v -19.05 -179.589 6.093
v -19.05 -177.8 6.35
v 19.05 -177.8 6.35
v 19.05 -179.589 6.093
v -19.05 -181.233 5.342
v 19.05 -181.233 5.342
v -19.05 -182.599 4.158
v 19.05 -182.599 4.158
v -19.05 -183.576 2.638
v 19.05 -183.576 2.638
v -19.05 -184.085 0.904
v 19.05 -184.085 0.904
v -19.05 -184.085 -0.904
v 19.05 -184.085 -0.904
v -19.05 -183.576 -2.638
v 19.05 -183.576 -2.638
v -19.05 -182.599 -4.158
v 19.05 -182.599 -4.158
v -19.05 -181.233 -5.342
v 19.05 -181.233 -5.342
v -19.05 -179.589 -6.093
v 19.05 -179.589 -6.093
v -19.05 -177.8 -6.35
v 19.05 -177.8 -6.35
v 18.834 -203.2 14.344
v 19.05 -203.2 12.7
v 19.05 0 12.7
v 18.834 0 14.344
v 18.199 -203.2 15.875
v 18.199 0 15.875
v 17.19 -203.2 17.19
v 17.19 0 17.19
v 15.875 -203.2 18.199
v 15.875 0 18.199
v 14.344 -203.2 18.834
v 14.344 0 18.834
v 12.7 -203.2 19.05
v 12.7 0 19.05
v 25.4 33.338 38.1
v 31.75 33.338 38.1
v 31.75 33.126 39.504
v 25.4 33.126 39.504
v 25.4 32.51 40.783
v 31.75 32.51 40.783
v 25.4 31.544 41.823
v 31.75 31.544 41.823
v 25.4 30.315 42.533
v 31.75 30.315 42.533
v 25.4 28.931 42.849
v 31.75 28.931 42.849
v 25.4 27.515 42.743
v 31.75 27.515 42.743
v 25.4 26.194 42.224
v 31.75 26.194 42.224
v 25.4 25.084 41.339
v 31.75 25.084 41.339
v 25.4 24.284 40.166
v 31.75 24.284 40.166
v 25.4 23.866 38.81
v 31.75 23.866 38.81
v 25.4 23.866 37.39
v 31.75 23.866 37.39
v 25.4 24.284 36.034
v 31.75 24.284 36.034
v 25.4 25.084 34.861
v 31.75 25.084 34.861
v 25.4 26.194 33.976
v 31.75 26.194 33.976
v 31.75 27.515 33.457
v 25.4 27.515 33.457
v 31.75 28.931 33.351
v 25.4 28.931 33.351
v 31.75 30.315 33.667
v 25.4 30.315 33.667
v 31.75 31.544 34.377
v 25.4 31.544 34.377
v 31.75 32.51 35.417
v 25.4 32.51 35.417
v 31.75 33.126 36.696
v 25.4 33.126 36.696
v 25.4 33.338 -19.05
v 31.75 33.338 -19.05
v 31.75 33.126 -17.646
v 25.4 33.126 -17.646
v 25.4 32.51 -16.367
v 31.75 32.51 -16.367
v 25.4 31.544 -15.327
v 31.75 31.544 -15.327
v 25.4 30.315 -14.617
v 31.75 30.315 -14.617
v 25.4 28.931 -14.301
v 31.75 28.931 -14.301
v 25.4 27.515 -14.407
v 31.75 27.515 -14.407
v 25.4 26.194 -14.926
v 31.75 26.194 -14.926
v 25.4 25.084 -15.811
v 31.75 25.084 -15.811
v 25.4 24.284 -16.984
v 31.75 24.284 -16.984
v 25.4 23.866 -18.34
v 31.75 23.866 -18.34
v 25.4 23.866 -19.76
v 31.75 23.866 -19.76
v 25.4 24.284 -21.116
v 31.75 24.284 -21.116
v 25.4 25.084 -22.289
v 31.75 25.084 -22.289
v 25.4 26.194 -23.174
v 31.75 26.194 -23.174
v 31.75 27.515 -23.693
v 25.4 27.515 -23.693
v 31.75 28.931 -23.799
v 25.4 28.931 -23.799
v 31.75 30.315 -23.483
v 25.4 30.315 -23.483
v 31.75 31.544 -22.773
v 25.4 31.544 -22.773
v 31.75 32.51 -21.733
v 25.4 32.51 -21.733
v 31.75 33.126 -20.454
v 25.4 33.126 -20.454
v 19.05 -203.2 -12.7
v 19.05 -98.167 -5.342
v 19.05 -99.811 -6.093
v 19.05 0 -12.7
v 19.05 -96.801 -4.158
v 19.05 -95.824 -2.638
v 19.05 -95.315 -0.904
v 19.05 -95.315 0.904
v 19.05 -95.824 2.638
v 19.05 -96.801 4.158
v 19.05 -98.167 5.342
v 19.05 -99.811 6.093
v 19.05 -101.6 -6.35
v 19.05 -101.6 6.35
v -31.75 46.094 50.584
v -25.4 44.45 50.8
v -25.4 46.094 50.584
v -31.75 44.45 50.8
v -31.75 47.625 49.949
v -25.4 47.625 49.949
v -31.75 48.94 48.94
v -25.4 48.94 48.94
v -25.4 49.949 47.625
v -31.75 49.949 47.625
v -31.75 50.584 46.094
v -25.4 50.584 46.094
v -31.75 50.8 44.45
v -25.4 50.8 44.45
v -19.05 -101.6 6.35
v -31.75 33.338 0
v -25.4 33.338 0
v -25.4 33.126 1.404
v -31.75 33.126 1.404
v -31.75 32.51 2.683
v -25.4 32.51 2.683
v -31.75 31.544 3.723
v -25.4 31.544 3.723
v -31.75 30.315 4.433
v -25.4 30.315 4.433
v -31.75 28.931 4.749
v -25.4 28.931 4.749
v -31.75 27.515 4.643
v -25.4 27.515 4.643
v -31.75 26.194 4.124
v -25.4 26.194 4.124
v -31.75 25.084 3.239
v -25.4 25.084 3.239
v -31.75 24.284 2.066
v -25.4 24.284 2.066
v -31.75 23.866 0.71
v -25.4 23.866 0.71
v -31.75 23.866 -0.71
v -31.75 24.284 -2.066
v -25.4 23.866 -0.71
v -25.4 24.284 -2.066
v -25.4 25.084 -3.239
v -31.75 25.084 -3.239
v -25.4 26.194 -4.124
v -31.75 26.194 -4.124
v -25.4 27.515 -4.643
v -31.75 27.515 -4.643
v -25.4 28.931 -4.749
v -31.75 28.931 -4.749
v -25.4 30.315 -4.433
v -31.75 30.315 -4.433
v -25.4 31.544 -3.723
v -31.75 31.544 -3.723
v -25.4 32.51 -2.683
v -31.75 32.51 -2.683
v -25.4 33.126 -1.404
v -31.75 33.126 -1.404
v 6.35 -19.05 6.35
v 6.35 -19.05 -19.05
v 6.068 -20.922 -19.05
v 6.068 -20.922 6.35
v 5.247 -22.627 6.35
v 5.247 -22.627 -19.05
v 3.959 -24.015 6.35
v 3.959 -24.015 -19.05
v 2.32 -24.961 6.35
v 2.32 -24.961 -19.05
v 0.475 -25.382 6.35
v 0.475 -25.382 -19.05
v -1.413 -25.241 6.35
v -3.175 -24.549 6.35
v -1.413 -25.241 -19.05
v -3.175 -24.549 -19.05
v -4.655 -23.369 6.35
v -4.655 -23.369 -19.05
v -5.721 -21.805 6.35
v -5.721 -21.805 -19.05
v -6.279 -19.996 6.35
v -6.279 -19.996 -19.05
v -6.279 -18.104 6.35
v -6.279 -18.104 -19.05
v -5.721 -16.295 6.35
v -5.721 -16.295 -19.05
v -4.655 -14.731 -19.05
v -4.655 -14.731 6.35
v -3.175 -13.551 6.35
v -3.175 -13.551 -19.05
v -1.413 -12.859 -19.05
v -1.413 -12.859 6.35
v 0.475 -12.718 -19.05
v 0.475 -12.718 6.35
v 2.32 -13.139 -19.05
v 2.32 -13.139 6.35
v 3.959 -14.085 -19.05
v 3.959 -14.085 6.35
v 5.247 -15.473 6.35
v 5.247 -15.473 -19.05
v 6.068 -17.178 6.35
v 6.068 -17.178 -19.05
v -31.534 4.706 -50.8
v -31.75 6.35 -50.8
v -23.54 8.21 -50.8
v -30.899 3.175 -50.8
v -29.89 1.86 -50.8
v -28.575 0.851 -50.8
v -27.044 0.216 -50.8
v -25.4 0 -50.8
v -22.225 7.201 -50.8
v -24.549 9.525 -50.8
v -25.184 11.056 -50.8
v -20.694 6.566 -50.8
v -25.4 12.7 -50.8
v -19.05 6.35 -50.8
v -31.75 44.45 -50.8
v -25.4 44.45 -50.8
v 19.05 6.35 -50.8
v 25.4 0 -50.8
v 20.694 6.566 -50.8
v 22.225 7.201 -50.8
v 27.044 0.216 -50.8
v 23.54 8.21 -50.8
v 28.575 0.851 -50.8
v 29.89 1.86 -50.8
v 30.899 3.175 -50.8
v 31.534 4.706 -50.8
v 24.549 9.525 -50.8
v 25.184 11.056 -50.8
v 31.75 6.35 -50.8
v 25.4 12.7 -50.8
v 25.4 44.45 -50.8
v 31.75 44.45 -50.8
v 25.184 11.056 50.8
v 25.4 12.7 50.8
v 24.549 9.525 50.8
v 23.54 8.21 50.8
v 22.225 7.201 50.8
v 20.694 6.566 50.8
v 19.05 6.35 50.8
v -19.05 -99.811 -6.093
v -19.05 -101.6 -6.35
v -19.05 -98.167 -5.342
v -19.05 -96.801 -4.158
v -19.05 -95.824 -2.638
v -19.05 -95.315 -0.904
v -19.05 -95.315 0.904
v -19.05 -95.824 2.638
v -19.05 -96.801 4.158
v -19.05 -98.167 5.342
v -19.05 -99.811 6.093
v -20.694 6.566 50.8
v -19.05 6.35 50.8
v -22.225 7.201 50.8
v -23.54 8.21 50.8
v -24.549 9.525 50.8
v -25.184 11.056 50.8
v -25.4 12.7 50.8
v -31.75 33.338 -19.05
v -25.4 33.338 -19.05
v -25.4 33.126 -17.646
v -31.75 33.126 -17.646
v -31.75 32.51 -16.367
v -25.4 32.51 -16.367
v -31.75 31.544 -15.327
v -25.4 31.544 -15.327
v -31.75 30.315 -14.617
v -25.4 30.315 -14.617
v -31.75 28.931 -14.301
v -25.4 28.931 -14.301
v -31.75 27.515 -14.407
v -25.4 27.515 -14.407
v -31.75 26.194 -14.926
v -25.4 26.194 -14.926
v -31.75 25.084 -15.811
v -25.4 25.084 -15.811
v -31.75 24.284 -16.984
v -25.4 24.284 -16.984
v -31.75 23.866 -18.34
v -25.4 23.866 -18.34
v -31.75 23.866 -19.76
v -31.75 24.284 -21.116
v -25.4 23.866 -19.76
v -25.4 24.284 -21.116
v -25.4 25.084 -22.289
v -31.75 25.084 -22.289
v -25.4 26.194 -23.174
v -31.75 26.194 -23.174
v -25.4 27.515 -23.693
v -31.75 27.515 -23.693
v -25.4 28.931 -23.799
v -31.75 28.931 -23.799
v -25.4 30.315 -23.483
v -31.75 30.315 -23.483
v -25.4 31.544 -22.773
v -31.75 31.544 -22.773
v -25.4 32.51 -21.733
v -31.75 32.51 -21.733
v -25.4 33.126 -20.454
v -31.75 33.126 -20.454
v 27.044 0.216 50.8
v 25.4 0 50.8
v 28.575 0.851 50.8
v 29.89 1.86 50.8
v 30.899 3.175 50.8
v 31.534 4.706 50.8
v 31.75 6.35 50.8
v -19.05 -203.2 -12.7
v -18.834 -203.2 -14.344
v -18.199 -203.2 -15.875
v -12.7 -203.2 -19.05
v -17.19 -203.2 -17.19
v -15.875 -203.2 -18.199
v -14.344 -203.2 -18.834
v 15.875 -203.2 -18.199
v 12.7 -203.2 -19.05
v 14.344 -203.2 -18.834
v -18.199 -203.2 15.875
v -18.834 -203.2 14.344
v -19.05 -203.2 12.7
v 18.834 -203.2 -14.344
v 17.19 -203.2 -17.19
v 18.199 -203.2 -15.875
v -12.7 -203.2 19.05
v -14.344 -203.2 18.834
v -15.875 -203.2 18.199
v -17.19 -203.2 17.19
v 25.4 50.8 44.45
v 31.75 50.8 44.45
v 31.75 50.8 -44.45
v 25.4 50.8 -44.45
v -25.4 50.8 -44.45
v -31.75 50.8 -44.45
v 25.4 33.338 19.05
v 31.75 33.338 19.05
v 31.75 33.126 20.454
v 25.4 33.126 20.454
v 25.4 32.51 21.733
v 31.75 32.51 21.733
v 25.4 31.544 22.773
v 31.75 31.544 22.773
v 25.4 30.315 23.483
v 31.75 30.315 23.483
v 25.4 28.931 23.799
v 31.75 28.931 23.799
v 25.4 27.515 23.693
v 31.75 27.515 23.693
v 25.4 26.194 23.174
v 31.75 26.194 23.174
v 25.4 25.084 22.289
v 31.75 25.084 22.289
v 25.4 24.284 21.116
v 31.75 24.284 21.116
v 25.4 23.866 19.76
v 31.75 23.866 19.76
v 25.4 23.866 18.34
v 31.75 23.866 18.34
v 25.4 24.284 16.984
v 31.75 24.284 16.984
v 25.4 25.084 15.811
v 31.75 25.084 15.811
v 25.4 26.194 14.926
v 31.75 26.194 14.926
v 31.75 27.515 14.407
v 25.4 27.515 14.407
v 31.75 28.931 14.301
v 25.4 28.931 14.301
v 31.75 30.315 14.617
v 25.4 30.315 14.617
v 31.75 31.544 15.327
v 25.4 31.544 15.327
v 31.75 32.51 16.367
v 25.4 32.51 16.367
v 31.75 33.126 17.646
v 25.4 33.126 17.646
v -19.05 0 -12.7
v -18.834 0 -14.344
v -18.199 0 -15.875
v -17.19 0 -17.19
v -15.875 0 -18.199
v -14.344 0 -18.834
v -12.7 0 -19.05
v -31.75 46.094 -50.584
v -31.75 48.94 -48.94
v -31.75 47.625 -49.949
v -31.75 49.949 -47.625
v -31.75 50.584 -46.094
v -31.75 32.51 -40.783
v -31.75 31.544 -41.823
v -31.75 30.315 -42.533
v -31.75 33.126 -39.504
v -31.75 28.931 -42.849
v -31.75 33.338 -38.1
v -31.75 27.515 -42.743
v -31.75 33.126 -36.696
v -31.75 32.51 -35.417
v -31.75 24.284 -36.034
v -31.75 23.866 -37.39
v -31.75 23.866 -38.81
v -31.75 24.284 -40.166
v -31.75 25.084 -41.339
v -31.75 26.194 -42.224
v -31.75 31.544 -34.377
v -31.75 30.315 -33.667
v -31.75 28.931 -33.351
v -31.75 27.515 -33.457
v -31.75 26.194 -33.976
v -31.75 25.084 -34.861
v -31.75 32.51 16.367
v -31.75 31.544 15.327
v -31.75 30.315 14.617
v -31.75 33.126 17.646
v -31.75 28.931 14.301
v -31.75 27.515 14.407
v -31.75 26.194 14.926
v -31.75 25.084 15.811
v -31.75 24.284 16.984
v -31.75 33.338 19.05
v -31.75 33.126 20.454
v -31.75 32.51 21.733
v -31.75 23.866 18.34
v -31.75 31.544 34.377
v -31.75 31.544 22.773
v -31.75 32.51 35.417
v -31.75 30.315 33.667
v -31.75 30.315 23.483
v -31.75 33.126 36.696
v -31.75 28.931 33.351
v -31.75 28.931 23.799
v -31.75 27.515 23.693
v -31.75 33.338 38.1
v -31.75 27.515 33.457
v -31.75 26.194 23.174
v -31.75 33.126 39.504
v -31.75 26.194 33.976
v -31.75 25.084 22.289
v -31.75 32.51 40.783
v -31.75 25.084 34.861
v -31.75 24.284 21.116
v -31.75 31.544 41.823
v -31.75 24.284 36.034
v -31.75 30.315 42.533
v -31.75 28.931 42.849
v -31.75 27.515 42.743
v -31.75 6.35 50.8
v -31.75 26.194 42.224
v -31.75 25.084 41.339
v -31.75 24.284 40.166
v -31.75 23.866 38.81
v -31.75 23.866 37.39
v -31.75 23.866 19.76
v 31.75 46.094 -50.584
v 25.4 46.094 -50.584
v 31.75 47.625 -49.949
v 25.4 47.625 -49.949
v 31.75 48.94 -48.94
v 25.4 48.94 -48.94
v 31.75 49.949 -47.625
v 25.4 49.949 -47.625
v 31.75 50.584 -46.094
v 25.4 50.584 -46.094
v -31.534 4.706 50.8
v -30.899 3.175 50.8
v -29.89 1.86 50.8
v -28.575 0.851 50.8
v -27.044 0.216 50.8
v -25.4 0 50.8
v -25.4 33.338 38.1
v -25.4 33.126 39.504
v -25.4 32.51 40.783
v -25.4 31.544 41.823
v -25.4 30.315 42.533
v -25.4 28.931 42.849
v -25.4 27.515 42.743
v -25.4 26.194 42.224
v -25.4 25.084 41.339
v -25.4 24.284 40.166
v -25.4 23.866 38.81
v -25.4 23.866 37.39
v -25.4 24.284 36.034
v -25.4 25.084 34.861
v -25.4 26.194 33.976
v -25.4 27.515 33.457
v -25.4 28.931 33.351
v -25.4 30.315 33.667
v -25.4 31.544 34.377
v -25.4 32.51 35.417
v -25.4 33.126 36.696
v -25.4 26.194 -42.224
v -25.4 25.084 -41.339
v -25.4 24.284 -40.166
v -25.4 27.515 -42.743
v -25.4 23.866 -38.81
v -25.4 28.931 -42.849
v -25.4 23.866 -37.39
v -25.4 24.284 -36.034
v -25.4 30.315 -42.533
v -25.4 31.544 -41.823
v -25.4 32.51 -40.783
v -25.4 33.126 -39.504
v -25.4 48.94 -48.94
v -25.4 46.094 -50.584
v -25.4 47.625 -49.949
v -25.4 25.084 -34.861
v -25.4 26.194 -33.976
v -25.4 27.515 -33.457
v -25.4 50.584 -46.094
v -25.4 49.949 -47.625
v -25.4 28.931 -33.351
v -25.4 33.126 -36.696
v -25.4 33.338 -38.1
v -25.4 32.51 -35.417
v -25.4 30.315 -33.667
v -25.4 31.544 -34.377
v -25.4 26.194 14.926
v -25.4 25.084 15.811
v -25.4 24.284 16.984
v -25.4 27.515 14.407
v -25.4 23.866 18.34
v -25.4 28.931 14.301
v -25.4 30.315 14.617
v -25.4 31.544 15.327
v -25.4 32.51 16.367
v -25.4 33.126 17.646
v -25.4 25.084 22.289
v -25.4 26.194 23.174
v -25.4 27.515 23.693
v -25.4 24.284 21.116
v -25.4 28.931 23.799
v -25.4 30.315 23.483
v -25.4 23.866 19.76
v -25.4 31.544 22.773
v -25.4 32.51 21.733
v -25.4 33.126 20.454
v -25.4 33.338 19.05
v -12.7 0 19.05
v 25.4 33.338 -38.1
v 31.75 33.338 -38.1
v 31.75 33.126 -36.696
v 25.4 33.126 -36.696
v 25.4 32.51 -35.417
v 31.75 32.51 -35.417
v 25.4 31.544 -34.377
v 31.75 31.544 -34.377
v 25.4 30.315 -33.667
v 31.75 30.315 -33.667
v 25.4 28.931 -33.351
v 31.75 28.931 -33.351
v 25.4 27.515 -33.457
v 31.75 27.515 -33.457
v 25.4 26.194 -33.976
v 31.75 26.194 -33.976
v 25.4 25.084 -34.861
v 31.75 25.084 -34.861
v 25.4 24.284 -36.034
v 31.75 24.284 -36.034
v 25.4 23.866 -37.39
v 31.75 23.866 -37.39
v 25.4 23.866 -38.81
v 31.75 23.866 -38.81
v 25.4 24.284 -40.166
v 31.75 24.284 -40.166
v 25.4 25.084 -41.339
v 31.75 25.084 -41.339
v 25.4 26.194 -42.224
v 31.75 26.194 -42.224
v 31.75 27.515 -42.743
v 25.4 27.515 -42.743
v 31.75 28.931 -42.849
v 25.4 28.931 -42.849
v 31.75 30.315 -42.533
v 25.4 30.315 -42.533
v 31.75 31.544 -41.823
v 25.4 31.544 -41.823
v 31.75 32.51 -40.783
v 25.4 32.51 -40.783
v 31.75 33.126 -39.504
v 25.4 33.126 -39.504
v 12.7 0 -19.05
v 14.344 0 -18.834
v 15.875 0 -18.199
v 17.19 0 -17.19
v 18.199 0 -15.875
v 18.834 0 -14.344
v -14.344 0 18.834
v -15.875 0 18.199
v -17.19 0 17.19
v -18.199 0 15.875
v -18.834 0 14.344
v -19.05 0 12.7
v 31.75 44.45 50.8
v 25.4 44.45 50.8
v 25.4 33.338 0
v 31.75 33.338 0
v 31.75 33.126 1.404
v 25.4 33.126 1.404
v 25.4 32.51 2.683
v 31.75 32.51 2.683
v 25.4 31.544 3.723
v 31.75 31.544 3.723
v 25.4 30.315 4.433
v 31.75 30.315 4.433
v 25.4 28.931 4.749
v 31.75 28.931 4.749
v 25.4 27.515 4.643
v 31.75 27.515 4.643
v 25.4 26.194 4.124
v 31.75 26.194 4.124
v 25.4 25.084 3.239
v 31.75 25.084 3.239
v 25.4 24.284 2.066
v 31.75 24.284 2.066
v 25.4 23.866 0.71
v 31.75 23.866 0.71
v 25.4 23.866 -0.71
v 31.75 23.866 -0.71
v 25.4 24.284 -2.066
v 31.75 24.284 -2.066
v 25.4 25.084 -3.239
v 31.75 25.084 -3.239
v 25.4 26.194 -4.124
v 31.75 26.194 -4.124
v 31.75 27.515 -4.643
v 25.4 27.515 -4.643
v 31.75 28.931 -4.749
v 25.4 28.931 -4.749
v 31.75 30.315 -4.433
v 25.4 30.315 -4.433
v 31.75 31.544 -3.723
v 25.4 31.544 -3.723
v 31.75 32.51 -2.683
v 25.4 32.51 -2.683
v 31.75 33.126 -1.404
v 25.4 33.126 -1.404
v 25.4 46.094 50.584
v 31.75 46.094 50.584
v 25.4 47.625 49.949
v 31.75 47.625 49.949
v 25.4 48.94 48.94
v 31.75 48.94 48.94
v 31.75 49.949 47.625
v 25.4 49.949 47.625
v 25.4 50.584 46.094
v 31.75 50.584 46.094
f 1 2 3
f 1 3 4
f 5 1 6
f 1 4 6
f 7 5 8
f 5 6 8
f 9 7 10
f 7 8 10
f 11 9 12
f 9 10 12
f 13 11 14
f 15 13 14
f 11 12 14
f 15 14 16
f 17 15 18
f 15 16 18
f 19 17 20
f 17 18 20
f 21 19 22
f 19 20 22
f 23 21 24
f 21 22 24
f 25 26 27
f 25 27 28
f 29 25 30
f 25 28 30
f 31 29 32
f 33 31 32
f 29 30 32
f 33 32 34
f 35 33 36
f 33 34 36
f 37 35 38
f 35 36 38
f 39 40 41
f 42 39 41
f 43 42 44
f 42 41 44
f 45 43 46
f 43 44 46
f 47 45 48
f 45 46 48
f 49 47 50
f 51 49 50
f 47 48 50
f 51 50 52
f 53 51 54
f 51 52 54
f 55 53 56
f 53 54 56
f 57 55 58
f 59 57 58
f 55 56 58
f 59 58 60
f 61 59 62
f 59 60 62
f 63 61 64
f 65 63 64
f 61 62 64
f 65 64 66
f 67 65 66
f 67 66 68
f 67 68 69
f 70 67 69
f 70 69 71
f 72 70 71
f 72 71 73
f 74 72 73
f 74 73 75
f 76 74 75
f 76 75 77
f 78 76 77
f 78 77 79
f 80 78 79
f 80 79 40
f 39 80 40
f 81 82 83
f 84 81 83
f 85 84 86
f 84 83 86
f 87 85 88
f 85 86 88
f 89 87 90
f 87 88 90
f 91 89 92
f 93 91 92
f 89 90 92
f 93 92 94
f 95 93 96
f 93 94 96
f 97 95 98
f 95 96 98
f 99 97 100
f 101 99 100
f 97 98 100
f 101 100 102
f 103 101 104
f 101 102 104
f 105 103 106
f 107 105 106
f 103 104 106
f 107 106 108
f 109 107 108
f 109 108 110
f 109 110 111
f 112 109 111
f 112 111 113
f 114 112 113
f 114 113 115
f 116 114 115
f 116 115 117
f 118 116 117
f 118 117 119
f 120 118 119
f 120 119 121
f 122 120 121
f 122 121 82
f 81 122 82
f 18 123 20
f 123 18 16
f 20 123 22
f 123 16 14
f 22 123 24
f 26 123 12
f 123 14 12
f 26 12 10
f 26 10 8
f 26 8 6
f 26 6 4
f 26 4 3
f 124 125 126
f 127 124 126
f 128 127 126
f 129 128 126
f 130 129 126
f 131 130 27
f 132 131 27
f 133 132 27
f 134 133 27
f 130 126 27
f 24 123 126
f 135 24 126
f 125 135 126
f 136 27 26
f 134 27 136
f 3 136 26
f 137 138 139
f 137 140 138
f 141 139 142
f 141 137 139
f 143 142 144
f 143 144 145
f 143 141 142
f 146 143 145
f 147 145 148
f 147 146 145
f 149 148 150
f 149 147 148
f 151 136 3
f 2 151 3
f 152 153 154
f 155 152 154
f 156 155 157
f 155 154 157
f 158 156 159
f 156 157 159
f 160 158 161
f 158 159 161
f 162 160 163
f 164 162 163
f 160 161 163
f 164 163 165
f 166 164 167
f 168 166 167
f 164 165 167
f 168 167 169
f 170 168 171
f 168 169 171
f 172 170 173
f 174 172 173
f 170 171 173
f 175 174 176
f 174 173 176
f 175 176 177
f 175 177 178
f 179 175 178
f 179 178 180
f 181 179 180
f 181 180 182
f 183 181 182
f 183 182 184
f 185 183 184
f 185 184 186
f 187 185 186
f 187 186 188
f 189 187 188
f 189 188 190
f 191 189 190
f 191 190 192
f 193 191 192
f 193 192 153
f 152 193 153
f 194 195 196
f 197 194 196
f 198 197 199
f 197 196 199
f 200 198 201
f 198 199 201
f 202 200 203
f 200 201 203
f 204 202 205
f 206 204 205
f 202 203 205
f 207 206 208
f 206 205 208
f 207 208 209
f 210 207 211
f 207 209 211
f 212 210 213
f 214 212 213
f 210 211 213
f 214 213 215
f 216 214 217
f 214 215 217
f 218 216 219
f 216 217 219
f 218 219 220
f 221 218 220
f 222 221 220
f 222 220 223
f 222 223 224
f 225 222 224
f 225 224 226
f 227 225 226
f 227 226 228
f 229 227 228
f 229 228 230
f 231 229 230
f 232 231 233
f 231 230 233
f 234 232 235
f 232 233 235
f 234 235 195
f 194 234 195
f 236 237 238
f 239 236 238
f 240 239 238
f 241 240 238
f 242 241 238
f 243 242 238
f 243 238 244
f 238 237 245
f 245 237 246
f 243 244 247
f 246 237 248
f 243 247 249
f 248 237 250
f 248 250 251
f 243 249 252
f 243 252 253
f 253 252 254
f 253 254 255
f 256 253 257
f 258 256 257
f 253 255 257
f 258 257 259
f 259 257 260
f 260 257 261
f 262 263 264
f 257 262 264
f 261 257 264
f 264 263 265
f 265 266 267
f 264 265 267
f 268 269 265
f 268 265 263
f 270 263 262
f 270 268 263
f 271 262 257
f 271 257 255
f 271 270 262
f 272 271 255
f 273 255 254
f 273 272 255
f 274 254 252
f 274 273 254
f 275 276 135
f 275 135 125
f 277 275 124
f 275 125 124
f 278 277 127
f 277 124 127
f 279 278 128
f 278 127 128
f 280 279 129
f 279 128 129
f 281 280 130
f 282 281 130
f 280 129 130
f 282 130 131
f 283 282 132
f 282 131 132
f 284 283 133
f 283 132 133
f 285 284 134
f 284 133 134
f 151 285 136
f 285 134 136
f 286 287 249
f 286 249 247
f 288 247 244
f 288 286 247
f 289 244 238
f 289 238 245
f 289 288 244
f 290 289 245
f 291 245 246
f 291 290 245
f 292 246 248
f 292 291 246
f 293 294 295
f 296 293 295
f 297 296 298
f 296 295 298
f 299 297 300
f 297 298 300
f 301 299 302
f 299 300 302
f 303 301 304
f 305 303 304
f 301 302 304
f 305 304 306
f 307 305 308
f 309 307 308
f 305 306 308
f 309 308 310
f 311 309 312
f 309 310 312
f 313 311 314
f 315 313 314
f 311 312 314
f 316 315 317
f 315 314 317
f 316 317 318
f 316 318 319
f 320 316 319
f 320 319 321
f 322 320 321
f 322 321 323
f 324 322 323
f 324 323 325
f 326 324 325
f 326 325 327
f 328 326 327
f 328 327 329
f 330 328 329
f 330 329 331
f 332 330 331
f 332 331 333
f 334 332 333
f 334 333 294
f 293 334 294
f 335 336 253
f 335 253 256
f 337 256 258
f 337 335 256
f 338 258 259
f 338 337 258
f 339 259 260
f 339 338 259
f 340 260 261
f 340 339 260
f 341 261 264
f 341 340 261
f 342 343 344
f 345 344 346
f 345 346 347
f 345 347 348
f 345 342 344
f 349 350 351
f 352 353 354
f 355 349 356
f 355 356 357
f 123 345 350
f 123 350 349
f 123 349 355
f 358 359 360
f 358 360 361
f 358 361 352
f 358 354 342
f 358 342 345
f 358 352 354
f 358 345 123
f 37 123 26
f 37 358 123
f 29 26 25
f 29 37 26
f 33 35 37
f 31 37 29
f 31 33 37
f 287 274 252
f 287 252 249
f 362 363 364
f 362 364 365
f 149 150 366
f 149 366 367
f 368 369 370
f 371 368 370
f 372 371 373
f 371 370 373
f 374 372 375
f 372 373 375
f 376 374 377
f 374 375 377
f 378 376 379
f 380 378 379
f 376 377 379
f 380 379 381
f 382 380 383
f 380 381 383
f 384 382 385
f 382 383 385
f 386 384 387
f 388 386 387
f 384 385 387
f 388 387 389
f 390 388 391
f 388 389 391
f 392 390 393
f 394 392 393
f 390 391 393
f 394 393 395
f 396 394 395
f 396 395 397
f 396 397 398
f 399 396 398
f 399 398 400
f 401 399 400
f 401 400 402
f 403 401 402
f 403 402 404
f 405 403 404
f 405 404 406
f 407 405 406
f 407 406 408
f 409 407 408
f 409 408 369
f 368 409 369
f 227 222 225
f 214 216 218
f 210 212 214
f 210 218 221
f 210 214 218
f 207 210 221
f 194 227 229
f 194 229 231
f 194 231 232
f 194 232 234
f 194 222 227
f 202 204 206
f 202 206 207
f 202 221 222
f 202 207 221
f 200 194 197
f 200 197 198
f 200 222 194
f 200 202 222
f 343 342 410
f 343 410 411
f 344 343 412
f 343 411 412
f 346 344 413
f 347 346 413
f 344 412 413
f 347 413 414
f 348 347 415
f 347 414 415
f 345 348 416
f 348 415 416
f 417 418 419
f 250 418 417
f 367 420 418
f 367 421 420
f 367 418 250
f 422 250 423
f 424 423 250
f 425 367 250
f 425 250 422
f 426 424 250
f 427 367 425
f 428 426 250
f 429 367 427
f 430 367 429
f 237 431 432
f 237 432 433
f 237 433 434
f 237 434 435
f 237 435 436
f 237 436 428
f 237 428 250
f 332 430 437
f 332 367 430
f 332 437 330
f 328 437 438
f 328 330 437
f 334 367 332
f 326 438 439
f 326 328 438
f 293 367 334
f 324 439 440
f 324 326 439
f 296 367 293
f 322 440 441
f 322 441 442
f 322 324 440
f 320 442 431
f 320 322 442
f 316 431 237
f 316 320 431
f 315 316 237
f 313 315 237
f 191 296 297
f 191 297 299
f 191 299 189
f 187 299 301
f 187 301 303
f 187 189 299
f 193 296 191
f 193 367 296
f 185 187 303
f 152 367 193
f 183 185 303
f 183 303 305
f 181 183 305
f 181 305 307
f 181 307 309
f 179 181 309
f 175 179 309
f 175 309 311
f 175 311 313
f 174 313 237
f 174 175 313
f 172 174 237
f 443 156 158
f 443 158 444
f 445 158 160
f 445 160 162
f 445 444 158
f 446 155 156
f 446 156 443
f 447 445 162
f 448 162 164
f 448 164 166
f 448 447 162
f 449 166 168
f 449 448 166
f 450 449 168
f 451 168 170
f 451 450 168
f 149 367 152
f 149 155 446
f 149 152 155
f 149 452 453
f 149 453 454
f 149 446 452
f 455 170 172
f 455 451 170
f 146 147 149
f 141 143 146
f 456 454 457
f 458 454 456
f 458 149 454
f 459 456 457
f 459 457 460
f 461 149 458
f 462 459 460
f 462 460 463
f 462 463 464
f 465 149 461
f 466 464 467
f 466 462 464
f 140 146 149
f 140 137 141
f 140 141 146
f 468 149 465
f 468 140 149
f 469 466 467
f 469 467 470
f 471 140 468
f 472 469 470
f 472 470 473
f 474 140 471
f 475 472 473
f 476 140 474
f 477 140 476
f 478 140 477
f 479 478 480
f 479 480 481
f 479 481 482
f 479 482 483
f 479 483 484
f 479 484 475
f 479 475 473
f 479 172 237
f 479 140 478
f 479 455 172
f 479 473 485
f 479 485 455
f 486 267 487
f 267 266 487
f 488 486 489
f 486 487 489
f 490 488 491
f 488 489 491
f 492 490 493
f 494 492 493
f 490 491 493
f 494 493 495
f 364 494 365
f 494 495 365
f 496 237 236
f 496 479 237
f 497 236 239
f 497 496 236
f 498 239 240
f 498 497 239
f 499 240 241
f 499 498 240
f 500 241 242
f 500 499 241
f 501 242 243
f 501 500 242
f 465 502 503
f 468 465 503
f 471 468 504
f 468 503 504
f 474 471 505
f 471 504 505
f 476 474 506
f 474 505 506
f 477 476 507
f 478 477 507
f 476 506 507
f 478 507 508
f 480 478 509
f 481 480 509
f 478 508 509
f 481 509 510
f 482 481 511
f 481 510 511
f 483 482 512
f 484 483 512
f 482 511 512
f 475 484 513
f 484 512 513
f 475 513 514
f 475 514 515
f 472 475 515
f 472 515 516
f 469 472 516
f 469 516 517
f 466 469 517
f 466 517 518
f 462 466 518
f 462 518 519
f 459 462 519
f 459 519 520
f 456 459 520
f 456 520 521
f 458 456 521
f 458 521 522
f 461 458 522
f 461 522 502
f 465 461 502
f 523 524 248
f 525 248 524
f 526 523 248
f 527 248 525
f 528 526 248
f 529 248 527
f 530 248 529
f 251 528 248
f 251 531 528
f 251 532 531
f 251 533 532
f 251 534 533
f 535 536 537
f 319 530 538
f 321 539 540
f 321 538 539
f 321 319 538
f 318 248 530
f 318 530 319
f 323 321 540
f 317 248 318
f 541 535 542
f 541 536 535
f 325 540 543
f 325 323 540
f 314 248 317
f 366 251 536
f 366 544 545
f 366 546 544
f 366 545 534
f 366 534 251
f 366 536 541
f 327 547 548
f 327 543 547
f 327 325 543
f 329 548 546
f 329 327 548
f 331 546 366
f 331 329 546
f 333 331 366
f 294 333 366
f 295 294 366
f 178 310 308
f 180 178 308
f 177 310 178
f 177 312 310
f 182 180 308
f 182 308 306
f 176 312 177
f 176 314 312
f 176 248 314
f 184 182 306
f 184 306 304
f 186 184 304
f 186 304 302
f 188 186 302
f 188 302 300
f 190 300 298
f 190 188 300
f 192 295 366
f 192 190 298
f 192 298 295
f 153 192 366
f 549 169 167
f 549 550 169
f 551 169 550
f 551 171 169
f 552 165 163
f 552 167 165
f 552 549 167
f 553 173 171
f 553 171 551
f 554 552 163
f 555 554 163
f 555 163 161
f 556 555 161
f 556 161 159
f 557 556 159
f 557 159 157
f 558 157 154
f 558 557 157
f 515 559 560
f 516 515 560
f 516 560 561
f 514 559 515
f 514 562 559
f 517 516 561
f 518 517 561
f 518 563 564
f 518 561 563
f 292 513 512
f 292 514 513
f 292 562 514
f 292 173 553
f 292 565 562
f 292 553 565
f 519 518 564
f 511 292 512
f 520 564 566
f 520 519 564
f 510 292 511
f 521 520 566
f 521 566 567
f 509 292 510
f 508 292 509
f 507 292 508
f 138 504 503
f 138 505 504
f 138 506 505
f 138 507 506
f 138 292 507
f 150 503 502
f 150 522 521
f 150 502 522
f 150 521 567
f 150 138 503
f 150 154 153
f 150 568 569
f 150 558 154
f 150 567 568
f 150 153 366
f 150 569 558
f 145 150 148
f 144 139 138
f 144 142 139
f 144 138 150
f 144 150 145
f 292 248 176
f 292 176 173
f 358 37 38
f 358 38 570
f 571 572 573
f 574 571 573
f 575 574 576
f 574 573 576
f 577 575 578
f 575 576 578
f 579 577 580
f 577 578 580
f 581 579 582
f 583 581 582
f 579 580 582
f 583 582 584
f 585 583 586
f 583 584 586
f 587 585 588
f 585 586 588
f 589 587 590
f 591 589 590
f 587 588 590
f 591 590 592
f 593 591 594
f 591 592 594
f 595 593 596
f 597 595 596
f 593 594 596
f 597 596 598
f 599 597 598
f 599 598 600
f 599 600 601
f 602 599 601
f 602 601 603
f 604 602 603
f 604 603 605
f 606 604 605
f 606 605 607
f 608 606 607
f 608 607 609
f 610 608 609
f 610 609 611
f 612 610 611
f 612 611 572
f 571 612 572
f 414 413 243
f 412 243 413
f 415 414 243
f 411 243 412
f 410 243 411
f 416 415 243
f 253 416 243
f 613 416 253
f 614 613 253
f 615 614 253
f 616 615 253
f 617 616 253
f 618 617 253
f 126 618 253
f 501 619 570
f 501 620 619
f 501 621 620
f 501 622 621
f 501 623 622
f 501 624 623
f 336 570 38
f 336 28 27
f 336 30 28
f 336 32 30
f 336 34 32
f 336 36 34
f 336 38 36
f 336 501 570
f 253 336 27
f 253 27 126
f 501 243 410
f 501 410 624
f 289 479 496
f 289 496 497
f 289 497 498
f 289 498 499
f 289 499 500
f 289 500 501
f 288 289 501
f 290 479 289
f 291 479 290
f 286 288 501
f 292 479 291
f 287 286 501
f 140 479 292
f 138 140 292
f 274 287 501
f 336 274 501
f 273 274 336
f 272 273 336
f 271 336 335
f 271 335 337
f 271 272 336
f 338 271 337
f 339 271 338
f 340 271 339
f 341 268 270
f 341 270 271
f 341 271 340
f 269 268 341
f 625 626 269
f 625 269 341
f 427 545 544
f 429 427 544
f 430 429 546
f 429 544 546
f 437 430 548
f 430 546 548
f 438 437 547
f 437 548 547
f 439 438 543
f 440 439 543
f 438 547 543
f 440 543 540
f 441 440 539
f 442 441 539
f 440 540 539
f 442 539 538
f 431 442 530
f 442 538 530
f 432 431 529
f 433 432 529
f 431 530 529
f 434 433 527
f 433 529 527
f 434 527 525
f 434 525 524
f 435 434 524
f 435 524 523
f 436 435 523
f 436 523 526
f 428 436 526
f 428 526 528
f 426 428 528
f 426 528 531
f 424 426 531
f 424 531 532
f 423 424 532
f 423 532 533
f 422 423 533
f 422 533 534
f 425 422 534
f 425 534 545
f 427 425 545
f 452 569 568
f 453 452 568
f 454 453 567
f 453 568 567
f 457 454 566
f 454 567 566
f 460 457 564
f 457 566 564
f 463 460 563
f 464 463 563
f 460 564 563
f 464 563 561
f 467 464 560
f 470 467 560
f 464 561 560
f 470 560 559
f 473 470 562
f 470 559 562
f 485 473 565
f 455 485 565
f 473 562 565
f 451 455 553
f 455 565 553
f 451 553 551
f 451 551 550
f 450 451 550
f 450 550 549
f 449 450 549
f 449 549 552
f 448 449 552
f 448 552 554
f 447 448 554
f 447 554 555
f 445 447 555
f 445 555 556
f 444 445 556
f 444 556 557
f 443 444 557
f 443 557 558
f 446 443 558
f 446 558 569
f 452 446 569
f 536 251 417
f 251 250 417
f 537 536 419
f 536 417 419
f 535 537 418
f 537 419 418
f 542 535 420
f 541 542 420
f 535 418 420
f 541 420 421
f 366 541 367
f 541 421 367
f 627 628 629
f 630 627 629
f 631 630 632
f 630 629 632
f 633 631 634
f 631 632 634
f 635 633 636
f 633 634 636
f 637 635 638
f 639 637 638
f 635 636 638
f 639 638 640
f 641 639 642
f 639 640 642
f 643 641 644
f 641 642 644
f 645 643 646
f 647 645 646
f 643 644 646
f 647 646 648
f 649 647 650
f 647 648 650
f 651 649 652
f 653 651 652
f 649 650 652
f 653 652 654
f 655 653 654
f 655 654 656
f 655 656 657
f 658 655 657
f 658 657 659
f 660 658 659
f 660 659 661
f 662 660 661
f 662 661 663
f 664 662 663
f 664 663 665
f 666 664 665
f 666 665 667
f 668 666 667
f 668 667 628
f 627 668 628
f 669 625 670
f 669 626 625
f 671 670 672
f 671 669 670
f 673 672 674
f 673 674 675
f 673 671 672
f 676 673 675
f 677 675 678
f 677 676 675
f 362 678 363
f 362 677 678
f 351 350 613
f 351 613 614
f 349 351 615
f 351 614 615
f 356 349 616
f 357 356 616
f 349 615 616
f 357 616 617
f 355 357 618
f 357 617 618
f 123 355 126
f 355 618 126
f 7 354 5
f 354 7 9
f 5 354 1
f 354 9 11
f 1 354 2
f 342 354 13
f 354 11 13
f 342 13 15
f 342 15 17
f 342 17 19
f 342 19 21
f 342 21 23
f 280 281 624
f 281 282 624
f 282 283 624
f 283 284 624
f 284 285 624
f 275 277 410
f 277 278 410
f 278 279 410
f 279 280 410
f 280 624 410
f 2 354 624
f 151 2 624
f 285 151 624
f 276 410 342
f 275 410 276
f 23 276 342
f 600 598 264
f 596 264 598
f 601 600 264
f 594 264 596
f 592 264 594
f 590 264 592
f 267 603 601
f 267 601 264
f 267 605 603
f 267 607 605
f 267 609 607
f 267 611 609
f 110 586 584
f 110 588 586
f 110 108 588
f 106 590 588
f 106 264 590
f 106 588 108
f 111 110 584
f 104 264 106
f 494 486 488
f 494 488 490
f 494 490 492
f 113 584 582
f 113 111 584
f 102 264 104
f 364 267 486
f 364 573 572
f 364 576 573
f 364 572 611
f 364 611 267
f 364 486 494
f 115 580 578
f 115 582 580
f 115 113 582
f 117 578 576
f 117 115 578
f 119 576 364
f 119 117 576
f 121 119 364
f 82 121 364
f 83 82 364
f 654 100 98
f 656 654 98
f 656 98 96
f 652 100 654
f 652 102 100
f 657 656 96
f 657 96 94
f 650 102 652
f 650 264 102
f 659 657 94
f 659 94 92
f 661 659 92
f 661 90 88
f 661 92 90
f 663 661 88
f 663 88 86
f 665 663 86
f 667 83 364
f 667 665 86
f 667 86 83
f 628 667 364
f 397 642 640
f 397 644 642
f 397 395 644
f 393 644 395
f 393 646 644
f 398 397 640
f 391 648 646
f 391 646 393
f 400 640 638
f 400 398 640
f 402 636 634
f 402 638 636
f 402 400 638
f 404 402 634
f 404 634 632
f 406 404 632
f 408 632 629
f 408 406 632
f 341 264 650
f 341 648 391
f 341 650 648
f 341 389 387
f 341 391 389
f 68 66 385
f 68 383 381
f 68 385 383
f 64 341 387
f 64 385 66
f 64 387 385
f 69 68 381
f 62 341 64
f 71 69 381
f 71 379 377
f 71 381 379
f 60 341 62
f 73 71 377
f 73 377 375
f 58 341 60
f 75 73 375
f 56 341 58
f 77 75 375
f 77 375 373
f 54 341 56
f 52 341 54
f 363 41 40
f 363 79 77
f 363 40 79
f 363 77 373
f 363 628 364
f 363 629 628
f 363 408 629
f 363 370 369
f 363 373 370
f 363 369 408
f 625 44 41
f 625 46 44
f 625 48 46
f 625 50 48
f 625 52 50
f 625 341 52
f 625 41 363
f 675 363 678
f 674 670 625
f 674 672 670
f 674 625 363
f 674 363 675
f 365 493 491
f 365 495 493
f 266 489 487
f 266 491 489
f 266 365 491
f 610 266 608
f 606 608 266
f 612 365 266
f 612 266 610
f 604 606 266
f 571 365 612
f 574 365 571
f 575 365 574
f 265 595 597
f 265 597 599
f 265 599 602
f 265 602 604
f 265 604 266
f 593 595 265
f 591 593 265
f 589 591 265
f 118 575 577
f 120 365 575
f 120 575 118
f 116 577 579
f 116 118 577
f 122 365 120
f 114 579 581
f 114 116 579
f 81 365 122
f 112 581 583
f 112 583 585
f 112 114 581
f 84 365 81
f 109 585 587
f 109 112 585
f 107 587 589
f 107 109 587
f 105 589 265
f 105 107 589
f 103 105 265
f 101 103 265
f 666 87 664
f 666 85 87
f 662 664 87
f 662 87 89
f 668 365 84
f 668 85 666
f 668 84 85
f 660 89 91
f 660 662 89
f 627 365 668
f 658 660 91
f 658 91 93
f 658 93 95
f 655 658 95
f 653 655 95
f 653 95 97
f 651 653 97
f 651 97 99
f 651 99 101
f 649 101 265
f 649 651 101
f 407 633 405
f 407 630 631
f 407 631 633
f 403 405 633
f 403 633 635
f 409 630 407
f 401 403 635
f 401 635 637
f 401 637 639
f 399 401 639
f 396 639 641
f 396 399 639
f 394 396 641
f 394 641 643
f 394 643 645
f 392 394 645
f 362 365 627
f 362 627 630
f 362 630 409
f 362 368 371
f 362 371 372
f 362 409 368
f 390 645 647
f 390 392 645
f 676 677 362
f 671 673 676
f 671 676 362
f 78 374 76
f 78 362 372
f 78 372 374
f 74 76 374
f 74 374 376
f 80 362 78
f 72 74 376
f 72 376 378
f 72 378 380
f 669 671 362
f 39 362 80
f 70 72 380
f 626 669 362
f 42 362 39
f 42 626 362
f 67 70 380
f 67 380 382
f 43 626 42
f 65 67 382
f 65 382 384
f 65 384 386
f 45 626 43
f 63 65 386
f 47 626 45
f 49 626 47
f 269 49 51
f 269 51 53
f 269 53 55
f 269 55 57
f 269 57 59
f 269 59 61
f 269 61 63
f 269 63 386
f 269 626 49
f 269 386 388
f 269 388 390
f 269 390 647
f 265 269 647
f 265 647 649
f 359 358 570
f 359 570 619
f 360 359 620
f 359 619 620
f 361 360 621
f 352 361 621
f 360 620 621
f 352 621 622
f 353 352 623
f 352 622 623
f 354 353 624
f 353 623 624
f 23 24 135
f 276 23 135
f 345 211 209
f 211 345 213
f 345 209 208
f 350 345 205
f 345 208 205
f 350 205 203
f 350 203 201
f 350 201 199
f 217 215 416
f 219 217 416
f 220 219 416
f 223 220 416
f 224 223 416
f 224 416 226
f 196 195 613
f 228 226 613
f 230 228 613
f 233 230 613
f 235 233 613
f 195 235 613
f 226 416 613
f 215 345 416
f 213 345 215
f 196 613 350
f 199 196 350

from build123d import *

# Parameters (mm, degrees)
F1_DEPTH  = 203.2
F3_DEPTH  = 38.1
F5_DEPTH  = 50.8
F6_DEPTH  = 50.8
F7_R      = 4.7625
F8_DEPTH  = 63.5
F9_R      = 6.35
F10_R     = 6.35
F11_DEPTH = 25.4


with BuildPart() as f1:
    # F0 (on Front) → F1 (new body)
    with BuildSketch(Plane.XZ):
        with BuildLine():
            Line((-12.7, -19.05), (12.7, -19.05))
            ThreePointArc((12.7, -19.05), (17.1901280605, -17.1901280605), (19.05, -12.7))
            Line((19.05, -12.7), (19.05, 12.7))
            ThreePointArc((19.05, 12.7), (17.1901280605, 17.1901280605), (12.7, 19.05))
            Line((12.7, 19.05), (-12.7, 19.05))
            ThreePointArc((-12.7, 19.05), (-17.1901280605, 17.1901280605), (-19.05, 12.7))
            Line((-19.05, 12.7), (-19.05, -12.7))
            ThreePointArc((-19.05, -12.7), (-17.1901280605, -17.1901280605), (-12.7, -19.05))
        make_face()
    extrude(amount=F1_DEPTH)

    # F2 (on face) → F3 (cut)
    with BuildSketch(Plane.YZ.offset(19.05)):
        with BuildLine():
            Line((-177.8, -6.35), (-101.6, -6.35))
            ThreePointArc((-101.6, -6.35), (-95.25, 0), (-101.6, 6.35))
            Line((-101.6, 6.35), (-177.8, 6.35))
            ThreePointArc((-177.8, 6.35), (-184.15, 0), (-177.8, -6.35))
        make_face()
    extrude(amount=-F3_DEPTH, mode=Mode.SUBTRACT)

    # F4 (on Top) → F5 (join)
    with BuildSketch(Plane.XY):
        with BuildLine():
            ThreePointArc((-31.75, 6.35), (-29.8901280605, 1.8598719395), (-25.4, 0))
            Line((-25.4, 0), (25.4, 0))
            ThreePointArc((25.4, 0), (29.8901280605, 1.8598719395), (31.75, 6.35))
            Line((31.75, 6.35), (31.75, 50.8))
            Line((31.75, 50.8), (25.4, 50.8))
            Line((25.4, 50.8), (25.4, 12.7))
            ThreePointArc((25.4, 12.7), (23.5401280605, 8.2098719395), (19.05, 6.35))
            Line((19.05, 6.35), (-19.05, 6.35))
            ThreePointArc((-19.05, 6.35), (-23.5401280605, 8.2098719395), (-25.4, 12.7))
            Line((-25.4, 12.7), (-25.4, 50.8))
            Line((-25.4, 50.8), (-31.75, 50.8))
            Line((-31.75, 50.8), (-31.75, 6.35))
        make_face()
    extrude(amount=F5_DEPTH)

    # F6 (add): a face of the model
    f6_faces = [f1.faces().sort_by_distance(p)[0] for p in [
        (-26.2131967782, 31.75, 0),
    ]]
    extrude(f6_faces, amount=F6_DEPTH)

    # F7 (on face) → F8 (cut)
    with BuildSketch(Plane.YZ.offset(31.75)):
        with Locations((28.575, 38.1)):
            Circle(F7_R)
        with Locations((28.575, 19.05)):
            Circle(F7_R)
        with Locations((28.575, 0)):
            Circle(F7_R)
        with Locations((28.575, -19.05)):
            Circle(F7_R)
        with Locations((28.575, -38.1)):
            Circle(F7_R)
    extrude(amount=-F8_DEPTH, mode=Mode.SUBTRACT)

    # F9
    f9_edges = [f1.edges().sort_by_distance(p)[0] for p in [
        (28.575, 50.8, 50.8),
        (-28.575, 50.8, 50.8),
        (-28.575, 50.8, -50.8),
        (28.575, 50.8, -50.8),
    ]]
    fillet(f9_edges, radius=F9_R)

    # F10 (on face) → F11 (cut)
    with BuildSketch(Plane(origin=(0, 0, -19.05), x_dir=(1, 0, 0), z_dir=(0, 0, -1))):
        with Locations((0, 19.05)):
            Circle(F10_R)
    extrude(amount=-F11_DEPTH, mode=Mode.SUBTRACT)


solid = f1.part
